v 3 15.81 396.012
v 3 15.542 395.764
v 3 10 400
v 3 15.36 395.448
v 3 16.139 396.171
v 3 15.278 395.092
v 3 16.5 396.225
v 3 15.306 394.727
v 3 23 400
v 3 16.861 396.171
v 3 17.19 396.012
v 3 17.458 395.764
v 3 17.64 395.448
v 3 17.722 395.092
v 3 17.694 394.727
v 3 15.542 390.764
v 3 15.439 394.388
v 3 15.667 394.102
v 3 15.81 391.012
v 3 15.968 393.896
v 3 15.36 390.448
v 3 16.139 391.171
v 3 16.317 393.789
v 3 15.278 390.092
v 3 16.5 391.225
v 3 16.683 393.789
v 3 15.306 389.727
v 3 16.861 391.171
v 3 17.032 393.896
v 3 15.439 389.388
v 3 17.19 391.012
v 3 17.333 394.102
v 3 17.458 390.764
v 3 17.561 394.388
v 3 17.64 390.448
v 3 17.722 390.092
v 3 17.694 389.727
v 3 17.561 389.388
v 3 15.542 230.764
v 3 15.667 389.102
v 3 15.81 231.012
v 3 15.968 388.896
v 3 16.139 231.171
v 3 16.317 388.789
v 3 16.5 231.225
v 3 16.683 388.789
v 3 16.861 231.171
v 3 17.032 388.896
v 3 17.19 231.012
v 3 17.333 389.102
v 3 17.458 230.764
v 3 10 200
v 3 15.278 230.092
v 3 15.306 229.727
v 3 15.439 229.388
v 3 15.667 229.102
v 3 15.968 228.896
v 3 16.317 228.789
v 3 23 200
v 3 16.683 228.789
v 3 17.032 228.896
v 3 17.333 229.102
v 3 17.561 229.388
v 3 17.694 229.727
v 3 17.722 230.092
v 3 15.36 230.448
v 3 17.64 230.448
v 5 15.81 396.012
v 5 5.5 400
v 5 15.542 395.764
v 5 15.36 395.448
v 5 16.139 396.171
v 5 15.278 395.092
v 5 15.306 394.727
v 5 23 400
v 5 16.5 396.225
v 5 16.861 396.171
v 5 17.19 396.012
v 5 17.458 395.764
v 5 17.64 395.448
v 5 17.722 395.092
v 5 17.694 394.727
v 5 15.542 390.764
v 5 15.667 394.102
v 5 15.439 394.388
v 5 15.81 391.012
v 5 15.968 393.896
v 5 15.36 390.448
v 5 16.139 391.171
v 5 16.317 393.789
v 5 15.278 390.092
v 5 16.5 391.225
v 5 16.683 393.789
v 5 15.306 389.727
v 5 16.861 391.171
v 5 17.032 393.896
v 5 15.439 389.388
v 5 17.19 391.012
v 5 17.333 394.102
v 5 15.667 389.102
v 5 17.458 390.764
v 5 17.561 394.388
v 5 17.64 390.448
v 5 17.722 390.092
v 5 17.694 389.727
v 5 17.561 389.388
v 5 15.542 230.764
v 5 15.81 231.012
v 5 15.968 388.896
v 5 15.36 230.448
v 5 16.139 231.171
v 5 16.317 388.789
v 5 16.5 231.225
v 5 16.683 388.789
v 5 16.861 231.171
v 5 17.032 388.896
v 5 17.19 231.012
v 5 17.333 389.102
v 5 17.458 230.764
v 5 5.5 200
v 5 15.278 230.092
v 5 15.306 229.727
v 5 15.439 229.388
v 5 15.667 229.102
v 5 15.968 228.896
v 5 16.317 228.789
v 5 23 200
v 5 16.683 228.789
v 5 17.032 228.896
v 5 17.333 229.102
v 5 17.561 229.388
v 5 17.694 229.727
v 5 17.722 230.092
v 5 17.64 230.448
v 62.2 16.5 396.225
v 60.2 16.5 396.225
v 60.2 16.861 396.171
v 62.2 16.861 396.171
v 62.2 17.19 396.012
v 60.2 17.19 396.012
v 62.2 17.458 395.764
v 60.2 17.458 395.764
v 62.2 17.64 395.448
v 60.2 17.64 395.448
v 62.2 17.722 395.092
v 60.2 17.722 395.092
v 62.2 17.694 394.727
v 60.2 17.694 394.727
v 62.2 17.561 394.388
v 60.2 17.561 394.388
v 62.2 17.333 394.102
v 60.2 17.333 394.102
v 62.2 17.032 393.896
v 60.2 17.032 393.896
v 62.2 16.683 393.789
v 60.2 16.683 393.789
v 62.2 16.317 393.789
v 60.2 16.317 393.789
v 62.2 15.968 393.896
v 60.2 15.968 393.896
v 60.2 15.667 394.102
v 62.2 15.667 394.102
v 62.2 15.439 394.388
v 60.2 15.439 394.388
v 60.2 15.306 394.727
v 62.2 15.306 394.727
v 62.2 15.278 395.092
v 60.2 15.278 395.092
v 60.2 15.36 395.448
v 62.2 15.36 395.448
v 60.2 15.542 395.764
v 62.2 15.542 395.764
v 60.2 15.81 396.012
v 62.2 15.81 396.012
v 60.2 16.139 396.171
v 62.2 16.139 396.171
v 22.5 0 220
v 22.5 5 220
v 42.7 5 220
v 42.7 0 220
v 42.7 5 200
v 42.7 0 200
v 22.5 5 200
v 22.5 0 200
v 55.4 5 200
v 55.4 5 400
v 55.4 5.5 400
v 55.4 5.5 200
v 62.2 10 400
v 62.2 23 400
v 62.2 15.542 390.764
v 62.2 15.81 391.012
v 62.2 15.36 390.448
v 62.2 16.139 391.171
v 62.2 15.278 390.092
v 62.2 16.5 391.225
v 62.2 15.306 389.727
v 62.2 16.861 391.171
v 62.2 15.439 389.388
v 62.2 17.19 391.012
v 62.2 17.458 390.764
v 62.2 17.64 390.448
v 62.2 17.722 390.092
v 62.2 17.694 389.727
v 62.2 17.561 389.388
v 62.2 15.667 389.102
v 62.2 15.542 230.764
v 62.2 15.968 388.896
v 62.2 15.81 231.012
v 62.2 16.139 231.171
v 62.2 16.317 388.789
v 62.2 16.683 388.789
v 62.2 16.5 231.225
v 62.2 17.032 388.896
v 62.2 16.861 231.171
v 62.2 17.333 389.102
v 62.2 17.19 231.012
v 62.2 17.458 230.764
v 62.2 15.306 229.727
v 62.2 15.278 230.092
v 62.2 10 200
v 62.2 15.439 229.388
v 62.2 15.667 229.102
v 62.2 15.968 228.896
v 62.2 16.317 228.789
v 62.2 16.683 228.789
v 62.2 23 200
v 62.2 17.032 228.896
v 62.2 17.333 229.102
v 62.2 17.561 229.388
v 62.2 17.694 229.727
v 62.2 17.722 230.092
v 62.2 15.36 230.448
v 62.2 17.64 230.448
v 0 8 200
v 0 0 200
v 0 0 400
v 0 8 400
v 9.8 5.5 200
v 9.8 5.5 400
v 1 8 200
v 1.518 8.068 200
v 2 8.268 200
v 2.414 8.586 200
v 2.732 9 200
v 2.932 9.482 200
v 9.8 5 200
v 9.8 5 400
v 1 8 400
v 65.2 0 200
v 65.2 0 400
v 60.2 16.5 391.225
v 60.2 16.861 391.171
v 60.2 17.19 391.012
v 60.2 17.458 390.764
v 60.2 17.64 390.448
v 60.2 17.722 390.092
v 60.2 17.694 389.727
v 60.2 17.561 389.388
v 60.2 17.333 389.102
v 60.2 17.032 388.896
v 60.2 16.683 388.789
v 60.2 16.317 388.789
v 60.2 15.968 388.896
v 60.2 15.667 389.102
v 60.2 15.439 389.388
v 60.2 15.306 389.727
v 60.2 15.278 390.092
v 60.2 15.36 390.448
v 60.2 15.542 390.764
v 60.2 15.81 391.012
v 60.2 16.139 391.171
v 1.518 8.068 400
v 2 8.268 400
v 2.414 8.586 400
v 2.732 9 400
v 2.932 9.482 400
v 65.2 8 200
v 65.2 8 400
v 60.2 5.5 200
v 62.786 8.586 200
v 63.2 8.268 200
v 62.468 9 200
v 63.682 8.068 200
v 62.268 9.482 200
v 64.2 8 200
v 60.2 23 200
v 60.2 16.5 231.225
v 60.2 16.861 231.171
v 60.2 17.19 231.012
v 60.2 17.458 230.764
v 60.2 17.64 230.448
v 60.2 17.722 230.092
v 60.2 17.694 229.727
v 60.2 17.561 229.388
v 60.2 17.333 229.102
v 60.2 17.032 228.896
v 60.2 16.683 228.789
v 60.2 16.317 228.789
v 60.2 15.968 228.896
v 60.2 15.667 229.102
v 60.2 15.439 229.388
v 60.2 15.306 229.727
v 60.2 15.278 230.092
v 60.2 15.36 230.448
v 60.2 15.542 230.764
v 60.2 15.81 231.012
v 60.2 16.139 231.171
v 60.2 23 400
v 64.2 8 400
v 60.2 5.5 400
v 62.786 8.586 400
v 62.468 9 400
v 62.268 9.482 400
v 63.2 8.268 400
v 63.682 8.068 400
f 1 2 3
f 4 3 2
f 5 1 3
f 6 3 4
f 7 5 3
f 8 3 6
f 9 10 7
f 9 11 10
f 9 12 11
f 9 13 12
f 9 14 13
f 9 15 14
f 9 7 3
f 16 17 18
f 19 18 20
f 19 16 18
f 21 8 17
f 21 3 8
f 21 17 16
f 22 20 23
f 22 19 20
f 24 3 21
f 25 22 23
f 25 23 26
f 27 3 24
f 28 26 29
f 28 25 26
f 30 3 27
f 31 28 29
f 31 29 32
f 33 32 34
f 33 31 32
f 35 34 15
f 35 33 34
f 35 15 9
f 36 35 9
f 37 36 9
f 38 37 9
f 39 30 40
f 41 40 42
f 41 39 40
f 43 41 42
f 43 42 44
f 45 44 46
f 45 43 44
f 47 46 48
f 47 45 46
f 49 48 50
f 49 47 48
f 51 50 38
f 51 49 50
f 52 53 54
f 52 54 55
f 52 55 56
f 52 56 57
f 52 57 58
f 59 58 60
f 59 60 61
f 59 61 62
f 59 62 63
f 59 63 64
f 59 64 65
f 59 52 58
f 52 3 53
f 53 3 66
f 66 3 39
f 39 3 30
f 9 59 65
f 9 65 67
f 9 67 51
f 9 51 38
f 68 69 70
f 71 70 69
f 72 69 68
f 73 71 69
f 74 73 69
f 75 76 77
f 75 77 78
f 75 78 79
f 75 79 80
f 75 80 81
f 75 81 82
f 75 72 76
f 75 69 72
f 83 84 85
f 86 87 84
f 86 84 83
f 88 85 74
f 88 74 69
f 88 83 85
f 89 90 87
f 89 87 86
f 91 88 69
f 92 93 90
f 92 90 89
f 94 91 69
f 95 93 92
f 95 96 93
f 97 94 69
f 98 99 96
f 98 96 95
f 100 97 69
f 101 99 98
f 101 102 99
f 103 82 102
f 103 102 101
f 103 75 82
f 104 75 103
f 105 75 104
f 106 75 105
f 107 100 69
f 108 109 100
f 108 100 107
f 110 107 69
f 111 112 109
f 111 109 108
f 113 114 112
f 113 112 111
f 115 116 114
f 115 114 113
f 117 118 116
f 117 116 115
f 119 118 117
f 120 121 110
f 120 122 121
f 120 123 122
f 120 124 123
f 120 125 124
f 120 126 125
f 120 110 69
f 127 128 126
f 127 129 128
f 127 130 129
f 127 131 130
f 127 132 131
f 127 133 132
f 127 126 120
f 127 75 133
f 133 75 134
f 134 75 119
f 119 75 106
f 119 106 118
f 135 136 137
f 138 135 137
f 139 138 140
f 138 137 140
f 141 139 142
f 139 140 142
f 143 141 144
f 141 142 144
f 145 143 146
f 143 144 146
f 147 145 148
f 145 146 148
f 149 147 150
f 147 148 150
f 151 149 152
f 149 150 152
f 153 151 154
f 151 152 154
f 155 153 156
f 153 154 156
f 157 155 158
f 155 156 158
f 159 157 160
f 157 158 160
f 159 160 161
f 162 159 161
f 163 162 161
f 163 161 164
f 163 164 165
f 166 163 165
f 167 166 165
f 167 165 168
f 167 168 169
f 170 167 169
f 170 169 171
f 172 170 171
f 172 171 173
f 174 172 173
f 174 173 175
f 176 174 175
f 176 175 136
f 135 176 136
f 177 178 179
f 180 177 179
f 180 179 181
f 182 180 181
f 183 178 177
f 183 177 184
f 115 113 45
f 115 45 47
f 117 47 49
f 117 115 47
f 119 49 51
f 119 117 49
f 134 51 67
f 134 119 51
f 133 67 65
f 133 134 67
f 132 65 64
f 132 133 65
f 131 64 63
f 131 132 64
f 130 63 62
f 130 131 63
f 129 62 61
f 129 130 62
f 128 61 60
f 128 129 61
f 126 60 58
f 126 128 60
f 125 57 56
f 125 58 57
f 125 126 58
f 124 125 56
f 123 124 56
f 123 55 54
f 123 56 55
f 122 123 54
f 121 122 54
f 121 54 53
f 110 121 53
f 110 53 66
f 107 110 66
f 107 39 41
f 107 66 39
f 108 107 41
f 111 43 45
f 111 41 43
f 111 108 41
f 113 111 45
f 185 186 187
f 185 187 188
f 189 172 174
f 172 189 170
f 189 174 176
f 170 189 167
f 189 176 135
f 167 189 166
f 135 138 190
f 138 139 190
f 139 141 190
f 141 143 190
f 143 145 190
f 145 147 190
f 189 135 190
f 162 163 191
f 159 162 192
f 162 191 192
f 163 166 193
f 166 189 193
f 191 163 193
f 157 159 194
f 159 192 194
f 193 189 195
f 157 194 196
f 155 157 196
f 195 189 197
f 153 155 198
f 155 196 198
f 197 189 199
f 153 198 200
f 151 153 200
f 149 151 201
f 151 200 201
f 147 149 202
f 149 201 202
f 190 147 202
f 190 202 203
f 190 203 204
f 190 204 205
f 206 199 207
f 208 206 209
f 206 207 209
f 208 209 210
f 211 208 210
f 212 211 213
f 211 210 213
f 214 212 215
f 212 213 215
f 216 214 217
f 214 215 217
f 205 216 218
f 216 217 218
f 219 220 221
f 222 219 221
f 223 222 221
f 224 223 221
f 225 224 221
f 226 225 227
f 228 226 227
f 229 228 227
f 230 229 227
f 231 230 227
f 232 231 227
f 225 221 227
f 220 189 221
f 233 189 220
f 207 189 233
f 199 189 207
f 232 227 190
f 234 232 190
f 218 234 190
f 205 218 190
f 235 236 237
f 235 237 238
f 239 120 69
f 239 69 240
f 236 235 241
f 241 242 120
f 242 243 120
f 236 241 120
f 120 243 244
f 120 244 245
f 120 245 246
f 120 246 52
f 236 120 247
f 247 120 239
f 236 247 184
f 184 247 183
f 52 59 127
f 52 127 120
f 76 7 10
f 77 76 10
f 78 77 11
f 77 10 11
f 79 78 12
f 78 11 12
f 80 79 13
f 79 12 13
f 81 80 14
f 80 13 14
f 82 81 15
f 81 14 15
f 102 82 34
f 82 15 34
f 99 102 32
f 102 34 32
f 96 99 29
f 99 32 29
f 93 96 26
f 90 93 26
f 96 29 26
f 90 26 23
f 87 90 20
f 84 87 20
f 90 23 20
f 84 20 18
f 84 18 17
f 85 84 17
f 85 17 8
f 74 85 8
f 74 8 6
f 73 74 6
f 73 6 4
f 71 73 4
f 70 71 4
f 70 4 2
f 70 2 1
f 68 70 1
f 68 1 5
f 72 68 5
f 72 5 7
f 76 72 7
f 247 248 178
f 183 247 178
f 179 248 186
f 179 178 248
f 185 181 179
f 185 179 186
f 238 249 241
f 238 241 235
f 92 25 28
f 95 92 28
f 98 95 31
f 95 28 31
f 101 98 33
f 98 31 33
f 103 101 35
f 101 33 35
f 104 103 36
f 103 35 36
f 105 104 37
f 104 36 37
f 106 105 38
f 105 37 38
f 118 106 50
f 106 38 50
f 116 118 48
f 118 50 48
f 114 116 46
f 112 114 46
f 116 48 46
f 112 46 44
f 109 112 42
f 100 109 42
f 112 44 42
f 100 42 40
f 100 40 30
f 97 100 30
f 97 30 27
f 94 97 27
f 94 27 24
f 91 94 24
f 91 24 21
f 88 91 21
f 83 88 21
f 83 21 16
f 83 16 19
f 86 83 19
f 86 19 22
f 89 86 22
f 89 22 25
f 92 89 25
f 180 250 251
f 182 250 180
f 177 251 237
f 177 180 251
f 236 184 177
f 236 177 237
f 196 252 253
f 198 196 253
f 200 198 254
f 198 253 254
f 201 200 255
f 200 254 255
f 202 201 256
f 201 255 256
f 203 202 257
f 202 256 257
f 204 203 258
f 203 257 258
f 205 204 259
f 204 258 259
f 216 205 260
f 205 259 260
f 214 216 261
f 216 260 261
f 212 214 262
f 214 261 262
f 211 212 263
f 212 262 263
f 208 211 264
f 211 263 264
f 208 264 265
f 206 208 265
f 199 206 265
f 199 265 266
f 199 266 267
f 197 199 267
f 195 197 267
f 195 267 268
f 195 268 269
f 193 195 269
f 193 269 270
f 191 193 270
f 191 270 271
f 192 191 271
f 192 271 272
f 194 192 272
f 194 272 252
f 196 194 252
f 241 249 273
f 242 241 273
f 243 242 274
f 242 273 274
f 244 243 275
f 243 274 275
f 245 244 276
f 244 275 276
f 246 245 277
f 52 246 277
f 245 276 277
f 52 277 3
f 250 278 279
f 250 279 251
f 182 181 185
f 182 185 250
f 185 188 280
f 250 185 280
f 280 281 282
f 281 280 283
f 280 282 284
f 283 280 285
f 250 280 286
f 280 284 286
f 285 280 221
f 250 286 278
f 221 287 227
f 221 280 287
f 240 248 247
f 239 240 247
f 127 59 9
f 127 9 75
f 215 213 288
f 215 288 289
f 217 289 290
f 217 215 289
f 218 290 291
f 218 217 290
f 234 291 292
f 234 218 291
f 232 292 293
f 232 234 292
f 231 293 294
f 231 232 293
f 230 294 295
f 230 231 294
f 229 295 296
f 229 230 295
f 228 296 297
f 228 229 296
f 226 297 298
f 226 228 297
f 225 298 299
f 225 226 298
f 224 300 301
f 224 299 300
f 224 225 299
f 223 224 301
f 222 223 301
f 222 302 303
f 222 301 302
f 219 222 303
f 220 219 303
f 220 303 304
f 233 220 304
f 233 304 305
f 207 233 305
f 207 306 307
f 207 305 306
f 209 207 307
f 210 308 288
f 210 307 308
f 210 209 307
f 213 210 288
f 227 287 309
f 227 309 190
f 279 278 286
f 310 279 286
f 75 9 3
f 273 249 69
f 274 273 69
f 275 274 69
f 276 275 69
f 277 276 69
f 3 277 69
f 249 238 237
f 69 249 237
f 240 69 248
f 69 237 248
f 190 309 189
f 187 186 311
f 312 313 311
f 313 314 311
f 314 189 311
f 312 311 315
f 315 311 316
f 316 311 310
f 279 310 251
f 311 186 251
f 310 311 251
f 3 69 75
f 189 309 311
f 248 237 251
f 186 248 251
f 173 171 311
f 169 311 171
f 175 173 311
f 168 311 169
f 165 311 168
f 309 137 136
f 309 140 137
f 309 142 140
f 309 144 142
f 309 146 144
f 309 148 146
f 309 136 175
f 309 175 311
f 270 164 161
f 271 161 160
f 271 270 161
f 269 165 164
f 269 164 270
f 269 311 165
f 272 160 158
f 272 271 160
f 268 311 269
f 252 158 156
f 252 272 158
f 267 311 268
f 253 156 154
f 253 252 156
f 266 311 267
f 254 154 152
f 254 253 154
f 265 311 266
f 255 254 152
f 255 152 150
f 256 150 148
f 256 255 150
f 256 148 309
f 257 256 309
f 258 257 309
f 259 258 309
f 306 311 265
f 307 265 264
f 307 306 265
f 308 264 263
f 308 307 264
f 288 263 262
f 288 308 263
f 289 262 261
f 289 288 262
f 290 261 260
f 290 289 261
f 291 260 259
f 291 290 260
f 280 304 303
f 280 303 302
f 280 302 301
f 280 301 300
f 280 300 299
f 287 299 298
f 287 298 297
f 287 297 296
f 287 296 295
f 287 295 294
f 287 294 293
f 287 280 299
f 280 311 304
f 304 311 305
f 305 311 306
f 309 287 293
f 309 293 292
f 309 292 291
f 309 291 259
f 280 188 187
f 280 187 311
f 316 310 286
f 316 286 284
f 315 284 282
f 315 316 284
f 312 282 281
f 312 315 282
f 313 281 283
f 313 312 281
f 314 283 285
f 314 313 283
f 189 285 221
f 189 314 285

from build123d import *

# Parameters (mm, degrees)
BOSS_EXTRUDE1_DEPTH      = 400
SKETCH2_R                = 2.1
CUT_EXTRUDE3_DEPTH       = 10
SKETCH3_W                = 158.039132068
SKETCH3_H                = 497.98789011
CUT_EXTRUDE4_DEPTH       = 2
SKETCH4_W                = 4.8
SKETCH4_H                = 400
BOSS_EXTRUDE2_DEPTH      = 8
SKETCH5_R                = 1.2
CUT_EXTRUDE9_DEPTH       = 406.158043237
SKETCH9_R                = 1.225
CUT_EXTRUDE10_DEPTH      = 406.931077894
SKETCH10_W               = 4.8
SKETCH10_H               = 400
CUT_EXTRUDE11_DEPTH      = 5
BOSS_EXTRUDE3_START      = -15
SKETCH12_R               = 2.1
BOSS_EXTRUDE3_DEPTH      = 15
SKETCH13_W               = 6.18
SKETCH13_H               = 37.25
BOSS_EXTRUDE5_DEPTH      = 10
BOSS_EXTRUDE6_DEPTH      = 6.18
SKETCH15_R               = 1.05
CUT_EXTRUDE12_DEPTH      = 10
FILLET1_R                = 2
SKETCH16_W               = 4.8
SKETCH16_H               = 400
CUT_EXTRUDE13_DEPTH      = 2.5
CUT_EXTRUDE14_REACH      = 404.247
SKETCH17_R               = 1.16
CUT_EXTRUDE16_DEPTH      = 406.158043237
CUT_EXTRUDE16_DEPTH_BACK = 406.158043237
SKETCH18_R               = 1.225
CUT_EXTRUDE17_DEPTH      = 406.158043237
CUT_EXTRUDE17_DEPTH_BACK = 406.158043237
SKETCH20_R               = 1.225
SKETCH22_W               = 3
SKETCH22_H               = 15
CUT_EXTRUDE18_DEPTH      = 406.931077894
FILLET2_R                = 2
FILLET3_R                = 2
SKETCH24_W               = 20.2
SKETCH24_H               = 20
SKETCH24_W_2             = 2
SKETCH24_H_2             = 200
SKETCH24_W_3             = 3
CUT_EXTRUDE21_DEPTH      = 406.931077894


with BuildPart() as part:
    # Sketch1 → Boss-Extrude1 (new body)
    with BuildSketch(Plane.XY):
        Polygon((0, 0), (0, 25), (5, 25), (5, 5), (60.2, 5), (60.2, 25), (65.2, 25), (65.2, 0), align=None)
    extrude(amount=BOSS_EXTRUDE1_DEPTH)

    # Sketch2 → Cut-Extrude3 (cut)
    with BuildSketch(Plane(origin=(0, 5, 0), x_dir=(1, 0, 0), z_dir=(0, 1, 0))):
        with Locations(Location((32.6, -67.17, 0), (0, 0, 270))):
            Circle(SKETCH2_R)
        with Locations(Location((32.6, -96.92, 0), (0, 0, 270))):
            Circle(SKETCH2_R)
    extrude(amount=-CUT_EXTRUDE3_DEPTH, mode=Mode.SUBTRACT)

    # Sketch3 → Cut-Extrude4 (cut)
    with BuildSketch(Plane(origin=(0, 25, 0), x_dir=(1, 0, 0), z_dir=(0, 1, 0))):
        with Locations((44.123686713, -201.646240959)):
            Rectangle(SKETCH3_W, SKETCH3_H)
    extrude(amount=-CUT_EXTRUDE4_DEPTH, mode=Mode.SUBTRACT)

    # Sketch4 → Boss-Extrude2 (add)
    with BuildSketch(Plane(origin=(0, 5, 0), x_dir=(1, 0, 0), z_dir=(0, 1, 0))):
        with Locations((7.4, -200)):
            Rectangle(SKETCH4_W, SKETCH4_H)
        with Locations((57.8, -200)):
            Rectangle(SKETCH4_W, SKETCH4_H)
    extrude(amount=BOSS_EXTRUDE2_DEPTH)

    # Sketch5 → Cut-Extrude9 (cut, through all)
    with BuildSketch(Plane(origin=(5, 0, 0), x_dir=(0, 0, -1), z_dir=(1, 0, 0))):
        with Locations(Location((-395, 16.5, 0), (0, 0, 90))):
            Circle(SKETCH5_R)
        with Locations(Location((-390, 16.5, 0), (0, 0, 90))):
            Circle(SKETCH5_R)
        with Locations(Location((-10, 16.5, 0), (0, 0, 90))):
            Circle(SKETCH5_R)
        with Locations(Location((-5, 16.5, 0), (0, 0, 90))):
            Circle(SKETCH5_R)
    extrude(amount=-CUT_EXTRUDE9_DEPTH, mode=Mode.SUBTRACT)

    # Sketch9 → Cut-Extrude10 (cut, through all)
    with BuildSketch(Plane.ZY):
        with Locations((5, 16.5)):
            Circle(SKETCH9_R)
        with Locations((10, 16.5)):
            Circle(SKETCH9_R)
        with Locations((390, 16.5)):
            Circle(SKETCH9_R)
        with Locations((395, 16.5)):
            Circle(SKETCH9_R)
    extrude(amount=-CUT_EXTRUDE10_DEPTH, mode=Mode.SUBTRACT)

    # Sketch10 → Cut-Extrude11 (cut)
    with BuildSketch(Plane(origin=(0, 13, 0), x_dir=(1, 0, 0), z_dir=(0, 1, 0))):
        with Locations((7.4, -200)):
            Rectangle(SKETCH10_W, SKETCH10_H)
        with Locations((57.8, -200)):
            Rectangle(SKETCH10_W, SKETCH10_H)
    extrude(amount=-CUT_EXTRUDE11_DEPTH, mode=Mode.SUBTRACT)

    # Sketch12 → Boss-Extrude3 (add)
    with BuildSketch(Plane.XZ.offset(BOSS_EXTRUDE3_START)):
        with Locations(Location((32.6, 96.92, 0), (0, 0, 270))):
            Circle(SKETCH12_R)
        with Locations(Location((32.6, 67.17, 0), (0, 0, 270))):
            Circle(SKETCH12_R)
    extrude(amount=BOSS_EXTRUDE3_DEPTH)

    # Sketch13 → Boss-Extrude5 (add)
    with BuildSketch(Plane(origin=(0, 5, 0), x_dir=(1, 0, 0), z_dir=(0, 1, 0))):
        with Locations((32.6, -82.045)):
            Rectangle(SKETCH13_W, SKETCH13_H)
    extrude(amount=BOSS_EXTRUDE5_DEPTH)

    # Sketch14 → Boss-Extrude6 (add)
    with BuildSketch(Plane.ZY.offset(-29.51)):
        Polygon((70.92, 15), (75.32, 19.4), (88.77, 19.4), (93.17, 15), align=None)
    extrude(amount=-BOSS_EXTRUDE6_DEPTH)

    # Sketch15 → Cut-Extrude12 (cut)
    with BuildSketch(Plane.ZY.offset(-29.51)):
        with Locations((78.87, 16)):
            Circle(SKETCH15_R)
        with Locations((85.22, 16)):
            Circle(SKETCH15_R)
    extrude(amount=-CUT_EXTRUDE12_DEPTH, mode=Mode.SUBTRACT)

    # Fillet1
    fillet1_edges = [part.edges().sort_by_distance(p)[0] for p in [
        (29.51, 5, 82.045),
        (29.51, 10, 63.42),
        (32.6, 5, 100.67),
        (29.51, 10, 100.67),
        (35.69, 5, 82.045),
        (35.69, 10, 100.67),
        (32.6, 5, 63.42),
        (35.69, 10, 63.42),
    ]]
    fillet(fillet1_edges, radius=FILLET1_R)

    # Sketch16 → Cut-Extrude13 (cut)
    with BuildSketch(Plane(origin=(0, 8, 0), x_dir=(1, 0, 0), z_dir=(0, 1, 0))):
        with Locations((7.4, -200)):
            Rectangle(SKETCH16_W, SKETCH16_H)
        with Locations((57.8, -200)):
            Rectangle(SKETCH16_W, SKETCH16_H)
    extrude(amount=-CUT_EXTRUDE13_DEPTH, mode=Mode.SUBTRACT)

    # Sketch17 → Cut-Extrude14 (cut, up to next)
    with BuildSketch(Plane.ZY.offset(-29.51), mode=Mode.PRIVATE) as cut_extrude14_sk1:
        with Locations((78.87, 16)):
            Circle(SKETCH17_R)
    cut_extrude14_tool1 = extrude(cut_extrude14_sk1.sketch, amount=-CUT_EXTRUDE14_REACH, mode=Mode.PRIVATE) & part.part
    # Sketch17 → Cut-Extrude14 (cut, up to next)
    with BuildSketch(Plane.ZY.offset(-29.51), mode=Mode.PRIVATE) as cut_extrude14_sk2:
        with Locations((85.22, 16)):
            Circle(SKETCH17_R)
    cut_extrude14_tool2 = extrude(cut_extrude14_sk2.sketch, amount=-CUT_EXTRUDE14_REACH, mode=Mode.PRIVATE) & part.part
    add(cut_extrude14_tool1.solids().sort_by_distance((29.51, 16, 78.87))[0], mode=Mode.SUBTRACT)
    add(cut_extrude14_tool2.solids().sort_by_distance((29.51, 16, 85.22))[0], mode=Mode.SUBTRACT)

    # Sketch18 → Cut-Extrude16 (cut, two sides: drawn at the far end of the back side and taken through both)
    with BuildSketch(Plane.ZY.offset(-60.2).offset(-CUT_EXTRUDE16_DEPTH_BACK)):
        with Locations((170, 16.5)):
            Circle(SKETCH18_R)
    extrude(amount=CUT_EXTRUDE16_DEPTH + CUT_EXTRUDE16_DEPTH_BACK, mode=Mode.SUBTRACT)

    # Sketch20 → Cut-Extrude17 (cut, two sides: drawn at the far end of the back side and taken through both)
    with BuildSketch(Plane.ZY.offset(-60.2).offset(-CUT_EXTRUDE17_DEPTH_BACK)):
        with Locations((230, 16.5)):
            Circle(SKETCH20_R)
    extrude(amount=CUT_EXTRUDE17_DEPTH + CUT_EXTRUDE17_DEPTH_BACK, mode=Mode.SUBTRACT)

    # Sketch22 → Cut-Extrude18 (cut, through all)
    with BuildSketch(Plane(origin=(0, 0, 0), x_dir=(-1, 0, 0), z_dir=(0, 0, -1))):
        with Locations((-63.7, 15.5)):
            Rectangle(SKETCH22_W, SKETCH22_H)
        with Locations((-1.5, 15.5)):
            Rectangle(SKETCH22_W, SKETCH22_H)
    extrude(amount=-CUT_EXTRUDE18_DEPTH, mode=Mode.SUBTRACT)

    # Fillet2
    fillet2_edges = [part.edges().sort_by_distance(p)[0] for p in [
        (62.2, 8, 200),
    ]]
    fillet(fillet2_edges, radius=FILLET2_R)

    # Fillet3
    fillet3_edges = [part.edges().sort_by_distance(p)[0] for p in [
        (3, 8, 200),
    ]]
    fillet(fillet3_edges, radius=FILLET3_R)

    # Sketch24 → Cut-Extrude21 (cut, through all)
    with BuildSketch(Plane(origin=(0, 23, 0), x_dir=(1, 0, 0), z_dir=(0, 1, 0))):
        Polygon((0, 0), (0, -200), (22.5, -200), (42.7, -200), (60.2, -200), (60.2, 0), align=None)
        with Locations((32.6, -210)):
            Rectangle(SKETCH24_W, SKETCH24_H)
        with Locations((61.2, -100)):
            Rectangle(SKETCH24_W_2, SKETCH24_H_2)
        with Locations((63.7, -100)):
            Rectangle(SKETCH24_W_3, SKETCH24_H_2)
    extrude(amount=-CUT_EXTRUDE21_DEPTH, mode=Mode.SUBTRACT)


solid = part.part
